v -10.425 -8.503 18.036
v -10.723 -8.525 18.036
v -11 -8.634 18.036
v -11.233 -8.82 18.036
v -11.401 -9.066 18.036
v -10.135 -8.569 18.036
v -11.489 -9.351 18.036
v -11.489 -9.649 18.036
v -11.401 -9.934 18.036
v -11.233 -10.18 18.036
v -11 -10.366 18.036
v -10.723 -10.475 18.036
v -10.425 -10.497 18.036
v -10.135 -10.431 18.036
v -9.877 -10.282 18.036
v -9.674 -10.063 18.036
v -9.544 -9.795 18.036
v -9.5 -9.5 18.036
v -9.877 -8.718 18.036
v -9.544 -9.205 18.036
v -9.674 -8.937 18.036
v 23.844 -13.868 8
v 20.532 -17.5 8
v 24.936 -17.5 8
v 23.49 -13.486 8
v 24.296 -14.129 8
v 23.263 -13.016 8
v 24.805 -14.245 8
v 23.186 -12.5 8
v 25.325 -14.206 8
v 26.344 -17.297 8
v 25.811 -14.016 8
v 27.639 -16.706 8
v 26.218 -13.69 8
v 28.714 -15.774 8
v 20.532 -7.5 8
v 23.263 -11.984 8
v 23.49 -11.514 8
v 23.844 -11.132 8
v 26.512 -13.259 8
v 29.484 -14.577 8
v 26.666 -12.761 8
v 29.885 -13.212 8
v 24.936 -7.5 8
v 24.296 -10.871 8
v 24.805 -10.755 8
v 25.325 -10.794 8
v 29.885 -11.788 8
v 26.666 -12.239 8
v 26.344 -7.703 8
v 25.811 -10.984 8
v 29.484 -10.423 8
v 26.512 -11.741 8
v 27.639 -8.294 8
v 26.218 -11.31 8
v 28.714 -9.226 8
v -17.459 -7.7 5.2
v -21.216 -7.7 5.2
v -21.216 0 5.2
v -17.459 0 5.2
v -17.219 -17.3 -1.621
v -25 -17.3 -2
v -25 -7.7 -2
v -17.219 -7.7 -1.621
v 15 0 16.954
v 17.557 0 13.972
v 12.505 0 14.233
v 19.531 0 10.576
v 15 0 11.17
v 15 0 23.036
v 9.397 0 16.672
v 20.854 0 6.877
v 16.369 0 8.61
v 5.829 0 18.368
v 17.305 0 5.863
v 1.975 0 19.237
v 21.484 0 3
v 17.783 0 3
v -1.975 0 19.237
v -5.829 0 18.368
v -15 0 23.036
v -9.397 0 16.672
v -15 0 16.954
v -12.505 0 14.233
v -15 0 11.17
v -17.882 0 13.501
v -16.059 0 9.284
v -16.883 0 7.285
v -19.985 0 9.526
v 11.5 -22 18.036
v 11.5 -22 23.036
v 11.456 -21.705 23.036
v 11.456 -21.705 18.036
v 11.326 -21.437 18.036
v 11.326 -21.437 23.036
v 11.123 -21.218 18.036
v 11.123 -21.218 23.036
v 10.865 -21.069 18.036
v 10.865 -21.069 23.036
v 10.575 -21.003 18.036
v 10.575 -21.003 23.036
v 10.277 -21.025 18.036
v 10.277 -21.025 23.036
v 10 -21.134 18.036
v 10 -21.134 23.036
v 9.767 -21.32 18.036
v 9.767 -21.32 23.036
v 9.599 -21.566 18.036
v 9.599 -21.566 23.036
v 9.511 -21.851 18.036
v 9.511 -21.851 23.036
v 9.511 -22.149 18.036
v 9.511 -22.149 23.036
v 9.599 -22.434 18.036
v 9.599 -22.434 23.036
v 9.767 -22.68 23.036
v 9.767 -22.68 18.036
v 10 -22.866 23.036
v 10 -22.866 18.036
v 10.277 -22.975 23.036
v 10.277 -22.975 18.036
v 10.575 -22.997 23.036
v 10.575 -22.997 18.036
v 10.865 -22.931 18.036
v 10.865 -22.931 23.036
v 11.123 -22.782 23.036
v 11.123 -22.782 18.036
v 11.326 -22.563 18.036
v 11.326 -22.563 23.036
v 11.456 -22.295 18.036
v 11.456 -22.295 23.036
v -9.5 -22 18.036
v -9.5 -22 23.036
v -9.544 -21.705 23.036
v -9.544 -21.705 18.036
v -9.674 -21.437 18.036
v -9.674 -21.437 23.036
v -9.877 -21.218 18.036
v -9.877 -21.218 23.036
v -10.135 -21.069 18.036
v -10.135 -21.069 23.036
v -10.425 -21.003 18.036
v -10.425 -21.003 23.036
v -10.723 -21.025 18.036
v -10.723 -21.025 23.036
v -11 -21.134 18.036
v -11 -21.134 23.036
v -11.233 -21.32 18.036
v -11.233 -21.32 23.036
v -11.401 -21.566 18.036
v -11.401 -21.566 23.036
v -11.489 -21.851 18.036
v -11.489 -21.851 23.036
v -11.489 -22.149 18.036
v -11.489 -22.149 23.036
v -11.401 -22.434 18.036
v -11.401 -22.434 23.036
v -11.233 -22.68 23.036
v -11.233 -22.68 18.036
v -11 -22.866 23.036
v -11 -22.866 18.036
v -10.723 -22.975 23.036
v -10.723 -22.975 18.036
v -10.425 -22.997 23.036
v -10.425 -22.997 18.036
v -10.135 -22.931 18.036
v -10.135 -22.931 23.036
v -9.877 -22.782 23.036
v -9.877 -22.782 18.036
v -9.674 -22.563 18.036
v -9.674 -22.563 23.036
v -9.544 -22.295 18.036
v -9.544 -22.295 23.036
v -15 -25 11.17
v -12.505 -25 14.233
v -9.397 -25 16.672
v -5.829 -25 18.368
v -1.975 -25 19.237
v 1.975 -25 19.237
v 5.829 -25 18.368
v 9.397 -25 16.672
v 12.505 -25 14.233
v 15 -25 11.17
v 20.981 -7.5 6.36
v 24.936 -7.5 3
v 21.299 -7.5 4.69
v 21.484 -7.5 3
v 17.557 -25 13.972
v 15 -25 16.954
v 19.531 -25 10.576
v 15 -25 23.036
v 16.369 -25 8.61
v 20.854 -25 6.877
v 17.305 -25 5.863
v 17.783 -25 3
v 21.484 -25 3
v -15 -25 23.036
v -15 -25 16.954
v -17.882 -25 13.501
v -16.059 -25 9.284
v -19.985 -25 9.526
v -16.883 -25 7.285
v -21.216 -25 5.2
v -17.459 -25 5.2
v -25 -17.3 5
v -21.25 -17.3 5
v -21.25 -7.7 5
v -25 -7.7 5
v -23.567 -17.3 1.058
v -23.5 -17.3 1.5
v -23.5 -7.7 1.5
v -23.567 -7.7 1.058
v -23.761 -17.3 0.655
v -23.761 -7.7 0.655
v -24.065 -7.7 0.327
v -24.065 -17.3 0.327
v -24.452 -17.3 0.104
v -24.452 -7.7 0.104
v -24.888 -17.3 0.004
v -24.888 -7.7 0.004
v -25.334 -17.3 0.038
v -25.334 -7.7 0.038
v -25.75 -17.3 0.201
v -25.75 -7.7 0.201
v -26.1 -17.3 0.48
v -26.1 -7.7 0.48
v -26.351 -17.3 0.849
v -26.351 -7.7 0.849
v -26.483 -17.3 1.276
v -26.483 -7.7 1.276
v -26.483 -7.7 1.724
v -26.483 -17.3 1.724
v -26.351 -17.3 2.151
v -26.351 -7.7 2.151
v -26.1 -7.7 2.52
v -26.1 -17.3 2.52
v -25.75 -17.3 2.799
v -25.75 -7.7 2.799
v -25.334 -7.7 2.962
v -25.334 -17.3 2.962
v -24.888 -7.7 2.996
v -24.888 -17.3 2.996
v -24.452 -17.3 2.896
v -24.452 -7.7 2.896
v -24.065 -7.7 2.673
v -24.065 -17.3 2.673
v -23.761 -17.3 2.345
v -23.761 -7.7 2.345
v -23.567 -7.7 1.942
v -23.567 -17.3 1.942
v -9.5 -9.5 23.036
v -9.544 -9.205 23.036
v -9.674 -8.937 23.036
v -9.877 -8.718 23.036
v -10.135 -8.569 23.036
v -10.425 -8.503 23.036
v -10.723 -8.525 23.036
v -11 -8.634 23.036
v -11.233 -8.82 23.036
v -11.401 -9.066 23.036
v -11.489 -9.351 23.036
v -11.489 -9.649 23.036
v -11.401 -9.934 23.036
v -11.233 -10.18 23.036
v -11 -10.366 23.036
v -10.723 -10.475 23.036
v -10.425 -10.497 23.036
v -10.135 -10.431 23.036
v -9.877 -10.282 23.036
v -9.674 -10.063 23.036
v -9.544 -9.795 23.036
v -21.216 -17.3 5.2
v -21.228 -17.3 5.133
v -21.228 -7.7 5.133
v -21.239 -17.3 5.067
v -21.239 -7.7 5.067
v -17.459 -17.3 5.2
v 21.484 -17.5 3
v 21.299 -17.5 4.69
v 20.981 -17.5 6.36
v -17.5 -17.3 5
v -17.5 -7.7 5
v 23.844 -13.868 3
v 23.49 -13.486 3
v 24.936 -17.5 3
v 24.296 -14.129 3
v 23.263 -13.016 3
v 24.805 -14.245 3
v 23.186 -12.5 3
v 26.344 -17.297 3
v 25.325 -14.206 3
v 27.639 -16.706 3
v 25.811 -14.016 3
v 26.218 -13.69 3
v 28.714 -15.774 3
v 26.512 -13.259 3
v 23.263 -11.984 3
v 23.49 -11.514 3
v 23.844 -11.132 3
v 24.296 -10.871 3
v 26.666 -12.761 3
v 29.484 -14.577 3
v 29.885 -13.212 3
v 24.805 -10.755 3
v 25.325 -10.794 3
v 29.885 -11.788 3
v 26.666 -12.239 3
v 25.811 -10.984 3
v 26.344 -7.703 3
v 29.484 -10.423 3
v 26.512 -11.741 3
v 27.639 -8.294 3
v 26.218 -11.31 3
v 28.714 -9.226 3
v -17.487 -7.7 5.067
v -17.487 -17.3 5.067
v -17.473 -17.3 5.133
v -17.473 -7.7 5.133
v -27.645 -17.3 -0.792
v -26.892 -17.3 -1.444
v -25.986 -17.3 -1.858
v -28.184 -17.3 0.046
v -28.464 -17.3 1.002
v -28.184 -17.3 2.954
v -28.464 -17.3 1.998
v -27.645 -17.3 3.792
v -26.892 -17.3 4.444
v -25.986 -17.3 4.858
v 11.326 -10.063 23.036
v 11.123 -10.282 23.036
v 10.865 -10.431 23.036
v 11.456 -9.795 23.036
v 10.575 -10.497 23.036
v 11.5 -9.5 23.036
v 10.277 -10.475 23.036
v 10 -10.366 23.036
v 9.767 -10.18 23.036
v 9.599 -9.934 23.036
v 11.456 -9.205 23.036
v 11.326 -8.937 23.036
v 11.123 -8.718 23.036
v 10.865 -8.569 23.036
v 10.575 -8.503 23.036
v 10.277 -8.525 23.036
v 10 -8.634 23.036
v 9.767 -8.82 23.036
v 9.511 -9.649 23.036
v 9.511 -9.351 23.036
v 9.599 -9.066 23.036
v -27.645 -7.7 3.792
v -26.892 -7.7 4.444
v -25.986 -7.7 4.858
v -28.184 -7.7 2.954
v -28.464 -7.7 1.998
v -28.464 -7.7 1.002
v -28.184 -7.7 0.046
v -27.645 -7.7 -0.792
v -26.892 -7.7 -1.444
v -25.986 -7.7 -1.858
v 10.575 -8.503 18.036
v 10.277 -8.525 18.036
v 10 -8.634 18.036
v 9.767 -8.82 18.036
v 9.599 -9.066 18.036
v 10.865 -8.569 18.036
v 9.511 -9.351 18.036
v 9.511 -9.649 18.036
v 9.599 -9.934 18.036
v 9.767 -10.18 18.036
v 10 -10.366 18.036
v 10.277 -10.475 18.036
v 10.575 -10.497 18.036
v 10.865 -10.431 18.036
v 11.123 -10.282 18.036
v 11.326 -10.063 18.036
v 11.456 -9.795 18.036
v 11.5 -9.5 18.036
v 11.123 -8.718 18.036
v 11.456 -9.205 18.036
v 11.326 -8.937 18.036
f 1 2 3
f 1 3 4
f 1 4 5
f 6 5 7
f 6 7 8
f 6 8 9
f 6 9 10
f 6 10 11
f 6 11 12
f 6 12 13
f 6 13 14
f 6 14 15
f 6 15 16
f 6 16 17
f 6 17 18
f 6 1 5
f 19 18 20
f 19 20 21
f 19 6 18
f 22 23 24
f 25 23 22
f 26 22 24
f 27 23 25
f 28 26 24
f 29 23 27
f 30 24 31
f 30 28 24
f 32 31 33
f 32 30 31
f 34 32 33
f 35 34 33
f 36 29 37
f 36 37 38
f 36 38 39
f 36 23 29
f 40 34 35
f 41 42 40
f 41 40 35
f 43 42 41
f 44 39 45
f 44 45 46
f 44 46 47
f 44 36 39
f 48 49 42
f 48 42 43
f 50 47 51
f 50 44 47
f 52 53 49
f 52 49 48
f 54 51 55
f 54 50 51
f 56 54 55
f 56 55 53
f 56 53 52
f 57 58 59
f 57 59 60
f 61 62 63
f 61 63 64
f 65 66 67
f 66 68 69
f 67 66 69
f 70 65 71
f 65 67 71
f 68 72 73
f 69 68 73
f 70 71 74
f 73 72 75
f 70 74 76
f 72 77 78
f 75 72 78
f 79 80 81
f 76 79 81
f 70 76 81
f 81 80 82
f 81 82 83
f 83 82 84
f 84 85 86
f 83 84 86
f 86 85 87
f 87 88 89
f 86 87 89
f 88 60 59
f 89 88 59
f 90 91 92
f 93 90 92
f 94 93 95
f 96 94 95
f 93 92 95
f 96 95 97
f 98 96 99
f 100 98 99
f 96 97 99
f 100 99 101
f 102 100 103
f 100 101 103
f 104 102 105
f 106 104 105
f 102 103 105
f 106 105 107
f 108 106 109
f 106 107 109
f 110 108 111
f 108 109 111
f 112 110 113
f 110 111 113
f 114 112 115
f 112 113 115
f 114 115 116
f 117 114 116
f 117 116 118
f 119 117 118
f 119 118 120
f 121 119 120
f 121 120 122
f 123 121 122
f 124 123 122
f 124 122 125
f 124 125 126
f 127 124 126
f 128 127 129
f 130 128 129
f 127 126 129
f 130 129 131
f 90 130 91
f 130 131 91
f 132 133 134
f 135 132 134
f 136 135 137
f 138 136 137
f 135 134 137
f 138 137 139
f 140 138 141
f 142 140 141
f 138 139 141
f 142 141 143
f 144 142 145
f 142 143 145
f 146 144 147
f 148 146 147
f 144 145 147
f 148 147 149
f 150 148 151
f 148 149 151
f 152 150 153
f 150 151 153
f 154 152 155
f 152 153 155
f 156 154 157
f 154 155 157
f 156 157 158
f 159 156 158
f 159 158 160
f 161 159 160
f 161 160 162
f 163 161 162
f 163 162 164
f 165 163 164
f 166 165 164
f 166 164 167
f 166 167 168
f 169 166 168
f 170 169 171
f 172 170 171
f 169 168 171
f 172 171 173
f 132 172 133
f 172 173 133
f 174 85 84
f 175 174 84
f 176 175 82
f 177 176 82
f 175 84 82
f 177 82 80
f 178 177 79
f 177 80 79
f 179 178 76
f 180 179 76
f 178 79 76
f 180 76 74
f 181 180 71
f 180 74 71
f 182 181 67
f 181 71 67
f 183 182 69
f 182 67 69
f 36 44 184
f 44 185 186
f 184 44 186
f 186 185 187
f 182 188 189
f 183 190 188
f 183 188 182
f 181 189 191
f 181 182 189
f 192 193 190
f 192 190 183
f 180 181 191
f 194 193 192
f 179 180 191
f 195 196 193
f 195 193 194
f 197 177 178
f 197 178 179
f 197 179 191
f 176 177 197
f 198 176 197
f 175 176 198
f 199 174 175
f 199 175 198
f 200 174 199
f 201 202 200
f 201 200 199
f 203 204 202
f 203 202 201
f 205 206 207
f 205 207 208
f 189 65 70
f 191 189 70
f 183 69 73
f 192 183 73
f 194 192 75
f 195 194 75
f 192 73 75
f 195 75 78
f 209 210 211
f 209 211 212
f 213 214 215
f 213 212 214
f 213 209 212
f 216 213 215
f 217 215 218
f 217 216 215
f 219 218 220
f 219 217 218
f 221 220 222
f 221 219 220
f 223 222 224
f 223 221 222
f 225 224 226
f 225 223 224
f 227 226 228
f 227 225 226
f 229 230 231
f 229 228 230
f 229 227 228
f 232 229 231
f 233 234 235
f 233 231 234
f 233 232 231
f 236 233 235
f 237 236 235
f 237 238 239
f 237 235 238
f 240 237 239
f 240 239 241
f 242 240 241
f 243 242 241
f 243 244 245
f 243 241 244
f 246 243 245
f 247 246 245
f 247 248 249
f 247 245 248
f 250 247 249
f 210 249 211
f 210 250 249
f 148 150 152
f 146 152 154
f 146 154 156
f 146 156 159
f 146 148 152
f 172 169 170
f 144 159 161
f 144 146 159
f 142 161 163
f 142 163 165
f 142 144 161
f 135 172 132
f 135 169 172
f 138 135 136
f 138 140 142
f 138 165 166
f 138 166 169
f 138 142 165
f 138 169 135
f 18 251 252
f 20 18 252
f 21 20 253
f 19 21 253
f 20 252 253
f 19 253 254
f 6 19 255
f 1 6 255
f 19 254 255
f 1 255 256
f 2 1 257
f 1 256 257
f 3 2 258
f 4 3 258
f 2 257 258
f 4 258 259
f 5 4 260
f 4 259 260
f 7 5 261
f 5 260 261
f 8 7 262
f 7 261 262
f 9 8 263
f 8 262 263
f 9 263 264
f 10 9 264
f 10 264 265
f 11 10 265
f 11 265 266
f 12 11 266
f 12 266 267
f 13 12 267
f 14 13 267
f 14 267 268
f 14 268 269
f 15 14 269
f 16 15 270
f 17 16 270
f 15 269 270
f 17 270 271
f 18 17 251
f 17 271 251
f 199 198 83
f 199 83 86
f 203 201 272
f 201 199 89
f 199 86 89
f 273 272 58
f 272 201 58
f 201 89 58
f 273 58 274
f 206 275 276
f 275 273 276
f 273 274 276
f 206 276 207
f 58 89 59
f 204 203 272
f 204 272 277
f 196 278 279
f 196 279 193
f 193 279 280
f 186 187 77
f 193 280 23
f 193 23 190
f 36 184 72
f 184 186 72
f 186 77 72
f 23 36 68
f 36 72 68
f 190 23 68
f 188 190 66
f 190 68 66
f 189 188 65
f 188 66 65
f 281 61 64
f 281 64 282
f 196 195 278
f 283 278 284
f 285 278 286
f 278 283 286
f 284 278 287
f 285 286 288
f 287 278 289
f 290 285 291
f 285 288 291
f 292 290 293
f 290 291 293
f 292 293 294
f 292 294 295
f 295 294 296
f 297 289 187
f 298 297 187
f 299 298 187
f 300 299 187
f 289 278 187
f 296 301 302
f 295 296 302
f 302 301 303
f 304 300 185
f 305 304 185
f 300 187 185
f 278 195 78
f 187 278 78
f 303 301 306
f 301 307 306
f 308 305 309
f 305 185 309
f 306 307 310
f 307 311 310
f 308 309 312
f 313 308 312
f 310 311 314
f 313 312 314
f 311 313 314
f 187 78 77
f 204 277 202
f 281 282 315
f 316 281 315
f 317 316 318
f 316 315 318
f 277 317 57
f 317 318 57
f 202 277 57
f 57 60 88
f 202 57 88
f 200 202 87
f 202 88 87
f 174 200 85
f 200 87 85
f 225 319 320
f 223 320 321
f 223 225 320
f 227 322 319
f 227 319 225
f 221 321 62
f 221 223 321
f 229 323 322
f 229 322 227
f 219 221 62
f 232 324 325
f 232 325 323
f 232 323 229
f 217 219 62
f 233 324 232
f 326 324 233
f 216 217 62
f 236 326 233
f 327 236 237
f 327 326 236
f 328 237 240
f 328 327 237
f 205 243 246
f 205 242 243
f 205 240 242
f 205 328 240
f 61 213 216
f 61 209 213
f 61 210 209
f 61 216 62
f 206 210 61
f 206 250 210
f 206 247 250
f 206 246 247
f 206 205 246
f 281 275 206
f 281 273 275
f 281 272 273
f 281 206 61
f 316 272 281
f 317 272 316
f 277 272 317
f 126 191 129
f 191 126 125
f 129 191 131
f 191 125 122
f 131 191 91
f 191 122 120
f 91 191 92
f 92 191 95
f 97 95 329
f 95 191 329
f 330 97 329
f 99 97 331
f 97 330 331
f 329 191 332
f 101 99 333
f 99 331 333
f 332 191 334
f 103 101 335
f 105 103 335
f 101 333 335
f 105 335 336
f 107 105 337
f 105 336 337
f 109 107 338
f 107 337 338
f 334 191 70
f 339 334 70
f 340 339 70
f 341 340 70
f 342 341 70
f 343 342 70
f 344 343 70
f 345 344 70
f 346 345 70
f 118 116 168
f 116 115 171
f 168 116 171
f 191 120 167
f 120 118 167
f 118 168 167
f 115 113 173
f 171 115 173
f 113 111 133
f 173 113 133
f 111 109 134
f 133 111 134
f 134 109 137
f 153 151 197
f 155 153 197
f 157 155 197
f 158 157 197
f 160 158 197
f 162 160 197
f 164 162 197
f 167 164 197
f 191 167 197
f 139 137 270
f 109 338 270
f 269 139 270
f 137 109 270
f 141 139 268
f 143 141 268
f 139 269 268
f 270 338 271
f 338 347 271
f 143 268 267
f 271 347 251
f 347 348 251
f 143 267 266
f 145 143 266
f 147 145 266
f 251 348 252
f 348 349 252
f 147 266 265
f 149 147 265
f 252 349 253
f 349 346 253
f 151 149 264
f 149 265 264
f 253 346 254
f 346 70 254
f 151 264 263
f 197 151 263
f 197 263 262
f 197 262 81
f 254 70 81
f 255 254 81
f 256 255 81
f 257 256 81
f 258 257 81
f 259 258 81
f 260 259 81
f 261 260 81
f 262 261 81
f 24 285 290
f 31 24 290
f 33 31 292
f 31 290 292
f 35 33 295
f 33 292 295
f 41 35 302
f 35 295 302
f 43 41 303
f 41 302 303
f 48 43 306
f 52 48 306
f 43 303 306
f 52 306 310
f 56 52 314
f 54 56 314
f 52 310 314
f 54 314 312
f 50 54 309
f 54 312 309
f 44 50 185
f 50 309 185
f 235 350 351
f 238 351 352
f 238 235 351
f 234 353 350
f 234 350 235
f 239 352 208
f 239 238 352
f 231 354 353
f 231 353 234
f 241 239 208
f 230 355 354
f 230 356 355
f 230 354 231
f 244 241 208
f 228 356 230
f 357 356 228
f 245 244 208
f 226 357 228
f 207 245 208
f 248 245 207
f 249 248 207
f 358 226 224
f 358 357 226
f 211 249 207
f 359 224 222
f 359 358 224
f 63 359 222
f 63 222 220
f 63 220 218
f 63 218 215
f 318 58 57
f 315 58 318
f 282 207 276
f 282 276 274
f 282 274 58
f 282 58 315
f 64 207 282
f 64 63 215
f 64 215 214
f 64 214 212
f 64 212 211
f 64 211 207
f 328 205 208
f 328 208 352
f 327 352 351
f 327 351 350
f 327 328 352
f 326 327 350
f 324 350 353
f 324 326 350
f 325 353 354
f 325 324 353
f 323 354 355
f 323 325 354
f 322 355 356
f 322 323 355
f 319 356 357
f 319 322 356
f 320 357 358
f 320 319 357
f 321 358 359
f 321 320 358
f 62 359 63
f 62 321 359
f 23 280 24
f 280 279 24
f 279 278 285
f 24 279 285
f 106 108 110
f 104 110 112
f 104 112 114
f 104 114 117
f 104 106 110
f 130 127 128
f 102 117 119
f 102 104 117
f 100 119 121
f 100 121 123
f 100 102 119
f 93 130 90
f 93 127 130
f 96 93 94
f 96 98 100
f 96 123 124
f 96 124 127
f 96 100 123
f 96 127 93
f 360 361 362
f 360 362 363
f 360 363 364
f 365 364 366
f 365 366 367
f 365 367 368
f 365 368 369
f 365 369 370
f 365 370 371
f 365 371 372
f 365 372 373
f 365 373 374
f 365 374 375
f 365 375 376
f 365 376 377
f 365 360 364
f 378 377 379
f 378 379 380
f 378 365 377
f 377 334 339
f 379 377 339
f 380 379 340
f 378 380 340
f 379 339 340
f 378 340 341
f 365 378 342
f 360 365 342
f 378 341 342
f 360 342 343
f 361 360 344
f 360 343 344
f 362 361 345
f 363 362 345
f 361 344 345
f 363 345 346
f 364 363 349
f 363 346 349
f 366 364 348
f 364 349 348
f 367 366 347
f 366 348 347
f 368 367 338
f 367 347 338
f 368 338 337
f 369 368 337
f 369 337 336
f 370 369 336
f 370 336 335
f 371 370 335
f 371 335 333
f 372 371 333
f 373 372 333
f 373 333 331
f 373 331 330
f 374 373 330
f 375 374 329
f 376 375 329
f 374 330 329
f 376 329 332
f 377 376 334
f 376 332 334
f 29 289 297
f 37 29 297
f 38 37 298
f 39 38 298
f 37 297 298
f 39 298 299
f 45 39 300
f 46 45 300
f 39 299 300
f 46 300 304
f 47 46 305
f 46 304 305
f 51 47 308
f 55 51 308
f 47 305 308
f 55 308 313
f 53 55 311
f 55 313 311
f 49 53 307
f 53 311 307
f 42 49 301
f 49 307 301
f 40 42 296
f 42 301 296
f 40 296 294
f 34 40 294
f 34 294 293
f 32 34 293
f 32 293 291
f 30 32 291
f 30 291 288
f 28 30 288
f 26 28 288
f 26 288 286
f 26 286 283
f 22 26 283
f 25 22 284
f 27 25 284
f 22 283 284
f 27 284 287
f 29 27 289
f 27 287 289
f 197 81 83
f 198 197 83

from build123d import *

# Parameters (mm, degrees)
BOSS_EXTRU_1_DEPTH      = 25
ESQUISSE2_R             = 1.5
BOSS_EXTRU_2_DEPTH      = 9.8
ESQUISSE3_W             = 31.176753694
ESQUISSE3_H             = 17.849543287
ENL_V_MAT_EXTRU_2_DEPTH = 0.2
ESQUISSE4_R             = 1.75
BOSS_EXTRU_3_DEPTH      = 5
ESQUISSE5_W             = 14.938362126
ESQUISSE5_H             = 3.694178454
ENL_V_MAT_EXTRU_3_DEPTH = 7.7
ESQUISSE6_W             = 7.972464104
ESQUISSE6_H             = 3.417362688
ENL_V_MAT_EXTRU_4_DEPTH = 7.7
BOSS_EXTRU_4_DEPTH      = 25
ESQUISSE8_R             = 1
ENL_V_MAT_EXTRU_5_DEPTH = 5


with BuildPart() as part:
    # Esquisse1 → Boss.-Extru.1 (new body)
    with BuildSketch(Plane(origin=(0, 0, 0), x_dir=(1, 0, 0), z_dir=(0, 1, 0))):
        with BuildLine():
            Line((17.783419244, -3), (21.484005679, -3))
            ThreePointArc((21.484005679, -3), (1.006821565, -23.012759245), (-21.25, -5))
            Line((-21.25, -5), (-17.5, -5))
            ThreePointArc((-17.5, -5), (1.009990899, -19.317966169), (17.783419244, -3))
        make_face()
    extrude(amount=-BOSS_EXTRU_1_DEPTH)

    # Esquisse2 → Boss.-Extru.2 (add)
    with BuildSketch(Plane(origin=(0, -17.5, 0), x_dir=(1, 0, 0), z_dir=(0, 1, 0))):
        with BuildLine():
            Line((-17.5, -5), (-25, -5))
            ThreePointArc((-25, -5), (-28.5, -1.5), (-25, 2))
            Line((-25, 2), (-17.219475506, 1.620843362))
            Line((-17.219475506, 1.620843362), (-17.5, -5))
        make_face()
        with Locations((-25, -1.5)):
            Circle(ESQUISSE2_R, mode=Mode.SUBTRACT)
    extrude(amount=BOSS_EXTRU_2_DEPTH)

    # Esquisse3 → Enlèv. mat.-Extru.2 (cut)
    with BuildSketch(Plane.XZ.offset(17.5)):
        with Locations((-26.283313767, -3.924771644)):
            Rectangle(ESQUISSE3_W, ESQUISSE3_H)
    extrude(amount=-ENL_V_MAT_EXTRU_2_DEPTH, mode=Mode.SUBTRACT)

    # Esquisse4 → Boss.-Extru.3 (add)
    with BuildSketch(Plane(origin=(0, 0, 3), x_dir=(-1, 0, 0), z_dir=(0, 0, -1))):
        with BuildLine():
            Line((-17.783419244, -17.5), (-24.935595774, -17.5))
            ThreePointArc((-24.935595774, -17.5), (-29.935595774, -12.5), (-24.935595774, -7.5))
            Line((-24.935595774, -7.5), (-17.783419244, -7.5))
            Line((-17.783419244, -7.5), (-17.783419244, -17.5))
        make_face()
        with Locations((-24.935595774, -12.5)):
            Circle(ESQUISSE4_R, mode=Mode.SUBTRACT)
    extrude(amount=-BOSS_EXTRU_3_DEPTH)

    # Esquisse5 → Enlèv. mat.-Extru.3 (cut)
    with BuildSketch(Plane(origin=(0, 0, 0), x_dir=(1, 0, 0), z_dir=(0, 1, 0))):
        with Locations((-16.074576592, -3.352910773)):
            Rectangle(ESQUISSE5_W, ESQUISSE5_H)
    extrude(amount=-ENL_V_MAT_EXTRU_3_DEPTH, mode=Mode.SUBTRACT)

    # Esquisse6 → Enlèv. mat.-Extru.4 (cut)
    with BuildSketch(Plane.XZ.offset(25)):
        with Locations((-19.148660485, 3.491318656)):
            Rectangle(ESQUISSE6_W, ESQUISSE6_H)
    extrude(amount=-ENL_V_MAT_EXTRU_4_DEPTH, mode=Mode.SUBTRACT)

    # Esquisse7 → Boss.-Extru.4 (add)
    with BuildSketch(Plane(origin=(0, 0, 0), x_dir=(1, 0, 0), z_dir=(0, 1, 0))):
        with BuildLine():
            Line((15, -11.169539803), (15, -23.036306554))
            Line((15, -23.036306554), (-15, -23.036306554))
            Line((-15, -23.036306554), (-15, -11.169539803))
            ThreePointArc((-15, -11.169539803), (0, -19.346568298), (15, -11.169539803))
        make_face()
    extrude(amount=-BOSS_EXTRU_4_DEPTH)

    # Esquisse8 → Enlèv. mat.-Extru.5 (cut)
    with BuildSketch(Plane.XY.offset(23.036306554)):
        with Locations((10.5, -22)):
            Circle(ESQUISSE8_R)
        with Locations((-10.5, -22)):
            Circle(ESQUISSE8_R)
        with Locations((10.5, -9.5)):
            Circle(ESQUISSE8_R)
        with Locations((-10.5, -9.5)):
            Circle(ESQUISSE8_R)
    extrude(amount=-ENL_V_MAT_EXTRU_5_DEPTH, mode=Mode.SUBTRACT)


solid = part.part
